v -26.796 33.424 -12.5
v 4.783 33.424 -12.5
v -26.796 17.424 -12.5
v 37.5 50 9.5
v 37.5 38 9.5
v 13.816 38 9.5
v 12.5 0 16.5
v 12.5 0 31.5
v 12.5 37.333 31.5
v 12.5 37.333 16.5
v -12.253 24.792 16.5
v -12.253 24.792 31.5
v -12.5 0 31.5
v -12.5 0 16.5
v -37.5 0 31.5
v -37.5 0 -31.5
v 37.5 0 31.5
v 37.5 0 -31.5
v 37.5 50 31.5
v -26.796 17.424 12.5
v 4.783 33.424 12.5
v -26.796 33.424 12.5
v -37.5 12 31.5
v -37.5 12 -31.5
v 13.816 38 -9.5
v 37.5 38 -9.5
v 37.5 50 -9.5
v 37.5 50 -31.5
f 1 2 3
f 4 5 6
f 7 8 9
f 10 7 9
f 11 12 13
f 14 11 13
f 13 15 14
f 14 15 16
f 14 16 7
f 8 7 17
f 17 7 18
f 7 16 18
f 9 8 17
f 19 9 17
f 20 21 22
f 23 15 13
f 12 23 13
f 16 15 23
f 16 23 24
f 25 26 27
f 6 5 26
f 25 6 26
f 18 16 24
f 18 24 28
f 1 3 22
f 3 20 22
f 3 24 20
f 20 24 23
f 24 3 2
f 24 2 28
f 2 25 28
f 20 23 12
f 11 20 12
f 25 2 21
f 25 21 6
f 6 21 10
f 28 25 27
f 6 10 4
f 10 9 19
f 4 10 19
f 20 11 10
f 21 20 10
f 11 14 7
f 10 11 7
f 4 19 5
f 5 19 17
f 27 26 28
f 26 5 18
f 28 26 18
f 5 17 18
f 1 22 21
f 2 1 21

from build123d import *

# Parameters (mm, degrees)
SKETCH2_W           = 75
SKETCH2_H           = 63
BOSS_EXTRUDE1_DEPTH = 50
CUT_EXTRUDE1_DEPTH  = 80
SKETCH6_W           = 19
SKETCH6_H           = 12
CUT_EXTRUDE2_DEPTH  = 80
CUT_EXTRUDE3_DEPTH  = 15
BOSS_EXTRUDE2_DEPTH = 12.5


with BuildPart() as part:
    # Sketch2 → Boss-Extrude1 (new body)
    with BuildSketch(Plane(origin=(0, 0, 0), x_dir=(1, 0, 0), z_dir=(0, 1, 0))):
        Rectangle(SKETCH2_W, SKETCH2_H)
    extrude(amount=BOSS_EXTRUDE1_DEPTH)

    # Sketch4 → Cut-Extrude1 (cut)
    with BuildSketch(Plane.XY.offset(31.5)):
        Polygon((-37.5, 12), (37.5, 50), (-37.5, 50), align=None)
    extrude(amount=-CUT_EXTRUDE1_DEPTH, mode=Mode.SUBTRACT)

    # Sketch6 → Cut-Extrude2 (cut)
    with BuildSketch(Plane(origin=(37.5, 0, 0), x_dir=(0, 0, -1), z_dir=(1, 0, 0))):
        with Locations((0, 44)):
            Rectangle(SKETCH6_W, SKETCH6_H)
    extrude(amount=-CUT_EXTRUDE2_DEPTH, mode=Mode.SUBTRACT)

    # Sketch8 → Cut-Extrude3 (cut)
    with BuildSketch(Plane.XY.offset(31.5)):
        Polygon((-12.253138509, 24.791743155), (-12.5, 0), (12.5, 0), (12.5, 37.333333333), align=None)
    extrude(amount=-CUT_EXTRUDE3_DEPTH, mode=Mode.SUBTRACT)

    # Sketch10 → Boss-Extrude2 (add, symmetric)
    with BuildSketch(Plane.XY):
        Polygon((4.783376681, 33.423577518), (-26.795570688, 17.423577518), (-26.795570688, 33.423577518), align=None)
    extrude(amount=BOSS_EXTRUDE2_DEPTH, both=True)


solid = part.part
